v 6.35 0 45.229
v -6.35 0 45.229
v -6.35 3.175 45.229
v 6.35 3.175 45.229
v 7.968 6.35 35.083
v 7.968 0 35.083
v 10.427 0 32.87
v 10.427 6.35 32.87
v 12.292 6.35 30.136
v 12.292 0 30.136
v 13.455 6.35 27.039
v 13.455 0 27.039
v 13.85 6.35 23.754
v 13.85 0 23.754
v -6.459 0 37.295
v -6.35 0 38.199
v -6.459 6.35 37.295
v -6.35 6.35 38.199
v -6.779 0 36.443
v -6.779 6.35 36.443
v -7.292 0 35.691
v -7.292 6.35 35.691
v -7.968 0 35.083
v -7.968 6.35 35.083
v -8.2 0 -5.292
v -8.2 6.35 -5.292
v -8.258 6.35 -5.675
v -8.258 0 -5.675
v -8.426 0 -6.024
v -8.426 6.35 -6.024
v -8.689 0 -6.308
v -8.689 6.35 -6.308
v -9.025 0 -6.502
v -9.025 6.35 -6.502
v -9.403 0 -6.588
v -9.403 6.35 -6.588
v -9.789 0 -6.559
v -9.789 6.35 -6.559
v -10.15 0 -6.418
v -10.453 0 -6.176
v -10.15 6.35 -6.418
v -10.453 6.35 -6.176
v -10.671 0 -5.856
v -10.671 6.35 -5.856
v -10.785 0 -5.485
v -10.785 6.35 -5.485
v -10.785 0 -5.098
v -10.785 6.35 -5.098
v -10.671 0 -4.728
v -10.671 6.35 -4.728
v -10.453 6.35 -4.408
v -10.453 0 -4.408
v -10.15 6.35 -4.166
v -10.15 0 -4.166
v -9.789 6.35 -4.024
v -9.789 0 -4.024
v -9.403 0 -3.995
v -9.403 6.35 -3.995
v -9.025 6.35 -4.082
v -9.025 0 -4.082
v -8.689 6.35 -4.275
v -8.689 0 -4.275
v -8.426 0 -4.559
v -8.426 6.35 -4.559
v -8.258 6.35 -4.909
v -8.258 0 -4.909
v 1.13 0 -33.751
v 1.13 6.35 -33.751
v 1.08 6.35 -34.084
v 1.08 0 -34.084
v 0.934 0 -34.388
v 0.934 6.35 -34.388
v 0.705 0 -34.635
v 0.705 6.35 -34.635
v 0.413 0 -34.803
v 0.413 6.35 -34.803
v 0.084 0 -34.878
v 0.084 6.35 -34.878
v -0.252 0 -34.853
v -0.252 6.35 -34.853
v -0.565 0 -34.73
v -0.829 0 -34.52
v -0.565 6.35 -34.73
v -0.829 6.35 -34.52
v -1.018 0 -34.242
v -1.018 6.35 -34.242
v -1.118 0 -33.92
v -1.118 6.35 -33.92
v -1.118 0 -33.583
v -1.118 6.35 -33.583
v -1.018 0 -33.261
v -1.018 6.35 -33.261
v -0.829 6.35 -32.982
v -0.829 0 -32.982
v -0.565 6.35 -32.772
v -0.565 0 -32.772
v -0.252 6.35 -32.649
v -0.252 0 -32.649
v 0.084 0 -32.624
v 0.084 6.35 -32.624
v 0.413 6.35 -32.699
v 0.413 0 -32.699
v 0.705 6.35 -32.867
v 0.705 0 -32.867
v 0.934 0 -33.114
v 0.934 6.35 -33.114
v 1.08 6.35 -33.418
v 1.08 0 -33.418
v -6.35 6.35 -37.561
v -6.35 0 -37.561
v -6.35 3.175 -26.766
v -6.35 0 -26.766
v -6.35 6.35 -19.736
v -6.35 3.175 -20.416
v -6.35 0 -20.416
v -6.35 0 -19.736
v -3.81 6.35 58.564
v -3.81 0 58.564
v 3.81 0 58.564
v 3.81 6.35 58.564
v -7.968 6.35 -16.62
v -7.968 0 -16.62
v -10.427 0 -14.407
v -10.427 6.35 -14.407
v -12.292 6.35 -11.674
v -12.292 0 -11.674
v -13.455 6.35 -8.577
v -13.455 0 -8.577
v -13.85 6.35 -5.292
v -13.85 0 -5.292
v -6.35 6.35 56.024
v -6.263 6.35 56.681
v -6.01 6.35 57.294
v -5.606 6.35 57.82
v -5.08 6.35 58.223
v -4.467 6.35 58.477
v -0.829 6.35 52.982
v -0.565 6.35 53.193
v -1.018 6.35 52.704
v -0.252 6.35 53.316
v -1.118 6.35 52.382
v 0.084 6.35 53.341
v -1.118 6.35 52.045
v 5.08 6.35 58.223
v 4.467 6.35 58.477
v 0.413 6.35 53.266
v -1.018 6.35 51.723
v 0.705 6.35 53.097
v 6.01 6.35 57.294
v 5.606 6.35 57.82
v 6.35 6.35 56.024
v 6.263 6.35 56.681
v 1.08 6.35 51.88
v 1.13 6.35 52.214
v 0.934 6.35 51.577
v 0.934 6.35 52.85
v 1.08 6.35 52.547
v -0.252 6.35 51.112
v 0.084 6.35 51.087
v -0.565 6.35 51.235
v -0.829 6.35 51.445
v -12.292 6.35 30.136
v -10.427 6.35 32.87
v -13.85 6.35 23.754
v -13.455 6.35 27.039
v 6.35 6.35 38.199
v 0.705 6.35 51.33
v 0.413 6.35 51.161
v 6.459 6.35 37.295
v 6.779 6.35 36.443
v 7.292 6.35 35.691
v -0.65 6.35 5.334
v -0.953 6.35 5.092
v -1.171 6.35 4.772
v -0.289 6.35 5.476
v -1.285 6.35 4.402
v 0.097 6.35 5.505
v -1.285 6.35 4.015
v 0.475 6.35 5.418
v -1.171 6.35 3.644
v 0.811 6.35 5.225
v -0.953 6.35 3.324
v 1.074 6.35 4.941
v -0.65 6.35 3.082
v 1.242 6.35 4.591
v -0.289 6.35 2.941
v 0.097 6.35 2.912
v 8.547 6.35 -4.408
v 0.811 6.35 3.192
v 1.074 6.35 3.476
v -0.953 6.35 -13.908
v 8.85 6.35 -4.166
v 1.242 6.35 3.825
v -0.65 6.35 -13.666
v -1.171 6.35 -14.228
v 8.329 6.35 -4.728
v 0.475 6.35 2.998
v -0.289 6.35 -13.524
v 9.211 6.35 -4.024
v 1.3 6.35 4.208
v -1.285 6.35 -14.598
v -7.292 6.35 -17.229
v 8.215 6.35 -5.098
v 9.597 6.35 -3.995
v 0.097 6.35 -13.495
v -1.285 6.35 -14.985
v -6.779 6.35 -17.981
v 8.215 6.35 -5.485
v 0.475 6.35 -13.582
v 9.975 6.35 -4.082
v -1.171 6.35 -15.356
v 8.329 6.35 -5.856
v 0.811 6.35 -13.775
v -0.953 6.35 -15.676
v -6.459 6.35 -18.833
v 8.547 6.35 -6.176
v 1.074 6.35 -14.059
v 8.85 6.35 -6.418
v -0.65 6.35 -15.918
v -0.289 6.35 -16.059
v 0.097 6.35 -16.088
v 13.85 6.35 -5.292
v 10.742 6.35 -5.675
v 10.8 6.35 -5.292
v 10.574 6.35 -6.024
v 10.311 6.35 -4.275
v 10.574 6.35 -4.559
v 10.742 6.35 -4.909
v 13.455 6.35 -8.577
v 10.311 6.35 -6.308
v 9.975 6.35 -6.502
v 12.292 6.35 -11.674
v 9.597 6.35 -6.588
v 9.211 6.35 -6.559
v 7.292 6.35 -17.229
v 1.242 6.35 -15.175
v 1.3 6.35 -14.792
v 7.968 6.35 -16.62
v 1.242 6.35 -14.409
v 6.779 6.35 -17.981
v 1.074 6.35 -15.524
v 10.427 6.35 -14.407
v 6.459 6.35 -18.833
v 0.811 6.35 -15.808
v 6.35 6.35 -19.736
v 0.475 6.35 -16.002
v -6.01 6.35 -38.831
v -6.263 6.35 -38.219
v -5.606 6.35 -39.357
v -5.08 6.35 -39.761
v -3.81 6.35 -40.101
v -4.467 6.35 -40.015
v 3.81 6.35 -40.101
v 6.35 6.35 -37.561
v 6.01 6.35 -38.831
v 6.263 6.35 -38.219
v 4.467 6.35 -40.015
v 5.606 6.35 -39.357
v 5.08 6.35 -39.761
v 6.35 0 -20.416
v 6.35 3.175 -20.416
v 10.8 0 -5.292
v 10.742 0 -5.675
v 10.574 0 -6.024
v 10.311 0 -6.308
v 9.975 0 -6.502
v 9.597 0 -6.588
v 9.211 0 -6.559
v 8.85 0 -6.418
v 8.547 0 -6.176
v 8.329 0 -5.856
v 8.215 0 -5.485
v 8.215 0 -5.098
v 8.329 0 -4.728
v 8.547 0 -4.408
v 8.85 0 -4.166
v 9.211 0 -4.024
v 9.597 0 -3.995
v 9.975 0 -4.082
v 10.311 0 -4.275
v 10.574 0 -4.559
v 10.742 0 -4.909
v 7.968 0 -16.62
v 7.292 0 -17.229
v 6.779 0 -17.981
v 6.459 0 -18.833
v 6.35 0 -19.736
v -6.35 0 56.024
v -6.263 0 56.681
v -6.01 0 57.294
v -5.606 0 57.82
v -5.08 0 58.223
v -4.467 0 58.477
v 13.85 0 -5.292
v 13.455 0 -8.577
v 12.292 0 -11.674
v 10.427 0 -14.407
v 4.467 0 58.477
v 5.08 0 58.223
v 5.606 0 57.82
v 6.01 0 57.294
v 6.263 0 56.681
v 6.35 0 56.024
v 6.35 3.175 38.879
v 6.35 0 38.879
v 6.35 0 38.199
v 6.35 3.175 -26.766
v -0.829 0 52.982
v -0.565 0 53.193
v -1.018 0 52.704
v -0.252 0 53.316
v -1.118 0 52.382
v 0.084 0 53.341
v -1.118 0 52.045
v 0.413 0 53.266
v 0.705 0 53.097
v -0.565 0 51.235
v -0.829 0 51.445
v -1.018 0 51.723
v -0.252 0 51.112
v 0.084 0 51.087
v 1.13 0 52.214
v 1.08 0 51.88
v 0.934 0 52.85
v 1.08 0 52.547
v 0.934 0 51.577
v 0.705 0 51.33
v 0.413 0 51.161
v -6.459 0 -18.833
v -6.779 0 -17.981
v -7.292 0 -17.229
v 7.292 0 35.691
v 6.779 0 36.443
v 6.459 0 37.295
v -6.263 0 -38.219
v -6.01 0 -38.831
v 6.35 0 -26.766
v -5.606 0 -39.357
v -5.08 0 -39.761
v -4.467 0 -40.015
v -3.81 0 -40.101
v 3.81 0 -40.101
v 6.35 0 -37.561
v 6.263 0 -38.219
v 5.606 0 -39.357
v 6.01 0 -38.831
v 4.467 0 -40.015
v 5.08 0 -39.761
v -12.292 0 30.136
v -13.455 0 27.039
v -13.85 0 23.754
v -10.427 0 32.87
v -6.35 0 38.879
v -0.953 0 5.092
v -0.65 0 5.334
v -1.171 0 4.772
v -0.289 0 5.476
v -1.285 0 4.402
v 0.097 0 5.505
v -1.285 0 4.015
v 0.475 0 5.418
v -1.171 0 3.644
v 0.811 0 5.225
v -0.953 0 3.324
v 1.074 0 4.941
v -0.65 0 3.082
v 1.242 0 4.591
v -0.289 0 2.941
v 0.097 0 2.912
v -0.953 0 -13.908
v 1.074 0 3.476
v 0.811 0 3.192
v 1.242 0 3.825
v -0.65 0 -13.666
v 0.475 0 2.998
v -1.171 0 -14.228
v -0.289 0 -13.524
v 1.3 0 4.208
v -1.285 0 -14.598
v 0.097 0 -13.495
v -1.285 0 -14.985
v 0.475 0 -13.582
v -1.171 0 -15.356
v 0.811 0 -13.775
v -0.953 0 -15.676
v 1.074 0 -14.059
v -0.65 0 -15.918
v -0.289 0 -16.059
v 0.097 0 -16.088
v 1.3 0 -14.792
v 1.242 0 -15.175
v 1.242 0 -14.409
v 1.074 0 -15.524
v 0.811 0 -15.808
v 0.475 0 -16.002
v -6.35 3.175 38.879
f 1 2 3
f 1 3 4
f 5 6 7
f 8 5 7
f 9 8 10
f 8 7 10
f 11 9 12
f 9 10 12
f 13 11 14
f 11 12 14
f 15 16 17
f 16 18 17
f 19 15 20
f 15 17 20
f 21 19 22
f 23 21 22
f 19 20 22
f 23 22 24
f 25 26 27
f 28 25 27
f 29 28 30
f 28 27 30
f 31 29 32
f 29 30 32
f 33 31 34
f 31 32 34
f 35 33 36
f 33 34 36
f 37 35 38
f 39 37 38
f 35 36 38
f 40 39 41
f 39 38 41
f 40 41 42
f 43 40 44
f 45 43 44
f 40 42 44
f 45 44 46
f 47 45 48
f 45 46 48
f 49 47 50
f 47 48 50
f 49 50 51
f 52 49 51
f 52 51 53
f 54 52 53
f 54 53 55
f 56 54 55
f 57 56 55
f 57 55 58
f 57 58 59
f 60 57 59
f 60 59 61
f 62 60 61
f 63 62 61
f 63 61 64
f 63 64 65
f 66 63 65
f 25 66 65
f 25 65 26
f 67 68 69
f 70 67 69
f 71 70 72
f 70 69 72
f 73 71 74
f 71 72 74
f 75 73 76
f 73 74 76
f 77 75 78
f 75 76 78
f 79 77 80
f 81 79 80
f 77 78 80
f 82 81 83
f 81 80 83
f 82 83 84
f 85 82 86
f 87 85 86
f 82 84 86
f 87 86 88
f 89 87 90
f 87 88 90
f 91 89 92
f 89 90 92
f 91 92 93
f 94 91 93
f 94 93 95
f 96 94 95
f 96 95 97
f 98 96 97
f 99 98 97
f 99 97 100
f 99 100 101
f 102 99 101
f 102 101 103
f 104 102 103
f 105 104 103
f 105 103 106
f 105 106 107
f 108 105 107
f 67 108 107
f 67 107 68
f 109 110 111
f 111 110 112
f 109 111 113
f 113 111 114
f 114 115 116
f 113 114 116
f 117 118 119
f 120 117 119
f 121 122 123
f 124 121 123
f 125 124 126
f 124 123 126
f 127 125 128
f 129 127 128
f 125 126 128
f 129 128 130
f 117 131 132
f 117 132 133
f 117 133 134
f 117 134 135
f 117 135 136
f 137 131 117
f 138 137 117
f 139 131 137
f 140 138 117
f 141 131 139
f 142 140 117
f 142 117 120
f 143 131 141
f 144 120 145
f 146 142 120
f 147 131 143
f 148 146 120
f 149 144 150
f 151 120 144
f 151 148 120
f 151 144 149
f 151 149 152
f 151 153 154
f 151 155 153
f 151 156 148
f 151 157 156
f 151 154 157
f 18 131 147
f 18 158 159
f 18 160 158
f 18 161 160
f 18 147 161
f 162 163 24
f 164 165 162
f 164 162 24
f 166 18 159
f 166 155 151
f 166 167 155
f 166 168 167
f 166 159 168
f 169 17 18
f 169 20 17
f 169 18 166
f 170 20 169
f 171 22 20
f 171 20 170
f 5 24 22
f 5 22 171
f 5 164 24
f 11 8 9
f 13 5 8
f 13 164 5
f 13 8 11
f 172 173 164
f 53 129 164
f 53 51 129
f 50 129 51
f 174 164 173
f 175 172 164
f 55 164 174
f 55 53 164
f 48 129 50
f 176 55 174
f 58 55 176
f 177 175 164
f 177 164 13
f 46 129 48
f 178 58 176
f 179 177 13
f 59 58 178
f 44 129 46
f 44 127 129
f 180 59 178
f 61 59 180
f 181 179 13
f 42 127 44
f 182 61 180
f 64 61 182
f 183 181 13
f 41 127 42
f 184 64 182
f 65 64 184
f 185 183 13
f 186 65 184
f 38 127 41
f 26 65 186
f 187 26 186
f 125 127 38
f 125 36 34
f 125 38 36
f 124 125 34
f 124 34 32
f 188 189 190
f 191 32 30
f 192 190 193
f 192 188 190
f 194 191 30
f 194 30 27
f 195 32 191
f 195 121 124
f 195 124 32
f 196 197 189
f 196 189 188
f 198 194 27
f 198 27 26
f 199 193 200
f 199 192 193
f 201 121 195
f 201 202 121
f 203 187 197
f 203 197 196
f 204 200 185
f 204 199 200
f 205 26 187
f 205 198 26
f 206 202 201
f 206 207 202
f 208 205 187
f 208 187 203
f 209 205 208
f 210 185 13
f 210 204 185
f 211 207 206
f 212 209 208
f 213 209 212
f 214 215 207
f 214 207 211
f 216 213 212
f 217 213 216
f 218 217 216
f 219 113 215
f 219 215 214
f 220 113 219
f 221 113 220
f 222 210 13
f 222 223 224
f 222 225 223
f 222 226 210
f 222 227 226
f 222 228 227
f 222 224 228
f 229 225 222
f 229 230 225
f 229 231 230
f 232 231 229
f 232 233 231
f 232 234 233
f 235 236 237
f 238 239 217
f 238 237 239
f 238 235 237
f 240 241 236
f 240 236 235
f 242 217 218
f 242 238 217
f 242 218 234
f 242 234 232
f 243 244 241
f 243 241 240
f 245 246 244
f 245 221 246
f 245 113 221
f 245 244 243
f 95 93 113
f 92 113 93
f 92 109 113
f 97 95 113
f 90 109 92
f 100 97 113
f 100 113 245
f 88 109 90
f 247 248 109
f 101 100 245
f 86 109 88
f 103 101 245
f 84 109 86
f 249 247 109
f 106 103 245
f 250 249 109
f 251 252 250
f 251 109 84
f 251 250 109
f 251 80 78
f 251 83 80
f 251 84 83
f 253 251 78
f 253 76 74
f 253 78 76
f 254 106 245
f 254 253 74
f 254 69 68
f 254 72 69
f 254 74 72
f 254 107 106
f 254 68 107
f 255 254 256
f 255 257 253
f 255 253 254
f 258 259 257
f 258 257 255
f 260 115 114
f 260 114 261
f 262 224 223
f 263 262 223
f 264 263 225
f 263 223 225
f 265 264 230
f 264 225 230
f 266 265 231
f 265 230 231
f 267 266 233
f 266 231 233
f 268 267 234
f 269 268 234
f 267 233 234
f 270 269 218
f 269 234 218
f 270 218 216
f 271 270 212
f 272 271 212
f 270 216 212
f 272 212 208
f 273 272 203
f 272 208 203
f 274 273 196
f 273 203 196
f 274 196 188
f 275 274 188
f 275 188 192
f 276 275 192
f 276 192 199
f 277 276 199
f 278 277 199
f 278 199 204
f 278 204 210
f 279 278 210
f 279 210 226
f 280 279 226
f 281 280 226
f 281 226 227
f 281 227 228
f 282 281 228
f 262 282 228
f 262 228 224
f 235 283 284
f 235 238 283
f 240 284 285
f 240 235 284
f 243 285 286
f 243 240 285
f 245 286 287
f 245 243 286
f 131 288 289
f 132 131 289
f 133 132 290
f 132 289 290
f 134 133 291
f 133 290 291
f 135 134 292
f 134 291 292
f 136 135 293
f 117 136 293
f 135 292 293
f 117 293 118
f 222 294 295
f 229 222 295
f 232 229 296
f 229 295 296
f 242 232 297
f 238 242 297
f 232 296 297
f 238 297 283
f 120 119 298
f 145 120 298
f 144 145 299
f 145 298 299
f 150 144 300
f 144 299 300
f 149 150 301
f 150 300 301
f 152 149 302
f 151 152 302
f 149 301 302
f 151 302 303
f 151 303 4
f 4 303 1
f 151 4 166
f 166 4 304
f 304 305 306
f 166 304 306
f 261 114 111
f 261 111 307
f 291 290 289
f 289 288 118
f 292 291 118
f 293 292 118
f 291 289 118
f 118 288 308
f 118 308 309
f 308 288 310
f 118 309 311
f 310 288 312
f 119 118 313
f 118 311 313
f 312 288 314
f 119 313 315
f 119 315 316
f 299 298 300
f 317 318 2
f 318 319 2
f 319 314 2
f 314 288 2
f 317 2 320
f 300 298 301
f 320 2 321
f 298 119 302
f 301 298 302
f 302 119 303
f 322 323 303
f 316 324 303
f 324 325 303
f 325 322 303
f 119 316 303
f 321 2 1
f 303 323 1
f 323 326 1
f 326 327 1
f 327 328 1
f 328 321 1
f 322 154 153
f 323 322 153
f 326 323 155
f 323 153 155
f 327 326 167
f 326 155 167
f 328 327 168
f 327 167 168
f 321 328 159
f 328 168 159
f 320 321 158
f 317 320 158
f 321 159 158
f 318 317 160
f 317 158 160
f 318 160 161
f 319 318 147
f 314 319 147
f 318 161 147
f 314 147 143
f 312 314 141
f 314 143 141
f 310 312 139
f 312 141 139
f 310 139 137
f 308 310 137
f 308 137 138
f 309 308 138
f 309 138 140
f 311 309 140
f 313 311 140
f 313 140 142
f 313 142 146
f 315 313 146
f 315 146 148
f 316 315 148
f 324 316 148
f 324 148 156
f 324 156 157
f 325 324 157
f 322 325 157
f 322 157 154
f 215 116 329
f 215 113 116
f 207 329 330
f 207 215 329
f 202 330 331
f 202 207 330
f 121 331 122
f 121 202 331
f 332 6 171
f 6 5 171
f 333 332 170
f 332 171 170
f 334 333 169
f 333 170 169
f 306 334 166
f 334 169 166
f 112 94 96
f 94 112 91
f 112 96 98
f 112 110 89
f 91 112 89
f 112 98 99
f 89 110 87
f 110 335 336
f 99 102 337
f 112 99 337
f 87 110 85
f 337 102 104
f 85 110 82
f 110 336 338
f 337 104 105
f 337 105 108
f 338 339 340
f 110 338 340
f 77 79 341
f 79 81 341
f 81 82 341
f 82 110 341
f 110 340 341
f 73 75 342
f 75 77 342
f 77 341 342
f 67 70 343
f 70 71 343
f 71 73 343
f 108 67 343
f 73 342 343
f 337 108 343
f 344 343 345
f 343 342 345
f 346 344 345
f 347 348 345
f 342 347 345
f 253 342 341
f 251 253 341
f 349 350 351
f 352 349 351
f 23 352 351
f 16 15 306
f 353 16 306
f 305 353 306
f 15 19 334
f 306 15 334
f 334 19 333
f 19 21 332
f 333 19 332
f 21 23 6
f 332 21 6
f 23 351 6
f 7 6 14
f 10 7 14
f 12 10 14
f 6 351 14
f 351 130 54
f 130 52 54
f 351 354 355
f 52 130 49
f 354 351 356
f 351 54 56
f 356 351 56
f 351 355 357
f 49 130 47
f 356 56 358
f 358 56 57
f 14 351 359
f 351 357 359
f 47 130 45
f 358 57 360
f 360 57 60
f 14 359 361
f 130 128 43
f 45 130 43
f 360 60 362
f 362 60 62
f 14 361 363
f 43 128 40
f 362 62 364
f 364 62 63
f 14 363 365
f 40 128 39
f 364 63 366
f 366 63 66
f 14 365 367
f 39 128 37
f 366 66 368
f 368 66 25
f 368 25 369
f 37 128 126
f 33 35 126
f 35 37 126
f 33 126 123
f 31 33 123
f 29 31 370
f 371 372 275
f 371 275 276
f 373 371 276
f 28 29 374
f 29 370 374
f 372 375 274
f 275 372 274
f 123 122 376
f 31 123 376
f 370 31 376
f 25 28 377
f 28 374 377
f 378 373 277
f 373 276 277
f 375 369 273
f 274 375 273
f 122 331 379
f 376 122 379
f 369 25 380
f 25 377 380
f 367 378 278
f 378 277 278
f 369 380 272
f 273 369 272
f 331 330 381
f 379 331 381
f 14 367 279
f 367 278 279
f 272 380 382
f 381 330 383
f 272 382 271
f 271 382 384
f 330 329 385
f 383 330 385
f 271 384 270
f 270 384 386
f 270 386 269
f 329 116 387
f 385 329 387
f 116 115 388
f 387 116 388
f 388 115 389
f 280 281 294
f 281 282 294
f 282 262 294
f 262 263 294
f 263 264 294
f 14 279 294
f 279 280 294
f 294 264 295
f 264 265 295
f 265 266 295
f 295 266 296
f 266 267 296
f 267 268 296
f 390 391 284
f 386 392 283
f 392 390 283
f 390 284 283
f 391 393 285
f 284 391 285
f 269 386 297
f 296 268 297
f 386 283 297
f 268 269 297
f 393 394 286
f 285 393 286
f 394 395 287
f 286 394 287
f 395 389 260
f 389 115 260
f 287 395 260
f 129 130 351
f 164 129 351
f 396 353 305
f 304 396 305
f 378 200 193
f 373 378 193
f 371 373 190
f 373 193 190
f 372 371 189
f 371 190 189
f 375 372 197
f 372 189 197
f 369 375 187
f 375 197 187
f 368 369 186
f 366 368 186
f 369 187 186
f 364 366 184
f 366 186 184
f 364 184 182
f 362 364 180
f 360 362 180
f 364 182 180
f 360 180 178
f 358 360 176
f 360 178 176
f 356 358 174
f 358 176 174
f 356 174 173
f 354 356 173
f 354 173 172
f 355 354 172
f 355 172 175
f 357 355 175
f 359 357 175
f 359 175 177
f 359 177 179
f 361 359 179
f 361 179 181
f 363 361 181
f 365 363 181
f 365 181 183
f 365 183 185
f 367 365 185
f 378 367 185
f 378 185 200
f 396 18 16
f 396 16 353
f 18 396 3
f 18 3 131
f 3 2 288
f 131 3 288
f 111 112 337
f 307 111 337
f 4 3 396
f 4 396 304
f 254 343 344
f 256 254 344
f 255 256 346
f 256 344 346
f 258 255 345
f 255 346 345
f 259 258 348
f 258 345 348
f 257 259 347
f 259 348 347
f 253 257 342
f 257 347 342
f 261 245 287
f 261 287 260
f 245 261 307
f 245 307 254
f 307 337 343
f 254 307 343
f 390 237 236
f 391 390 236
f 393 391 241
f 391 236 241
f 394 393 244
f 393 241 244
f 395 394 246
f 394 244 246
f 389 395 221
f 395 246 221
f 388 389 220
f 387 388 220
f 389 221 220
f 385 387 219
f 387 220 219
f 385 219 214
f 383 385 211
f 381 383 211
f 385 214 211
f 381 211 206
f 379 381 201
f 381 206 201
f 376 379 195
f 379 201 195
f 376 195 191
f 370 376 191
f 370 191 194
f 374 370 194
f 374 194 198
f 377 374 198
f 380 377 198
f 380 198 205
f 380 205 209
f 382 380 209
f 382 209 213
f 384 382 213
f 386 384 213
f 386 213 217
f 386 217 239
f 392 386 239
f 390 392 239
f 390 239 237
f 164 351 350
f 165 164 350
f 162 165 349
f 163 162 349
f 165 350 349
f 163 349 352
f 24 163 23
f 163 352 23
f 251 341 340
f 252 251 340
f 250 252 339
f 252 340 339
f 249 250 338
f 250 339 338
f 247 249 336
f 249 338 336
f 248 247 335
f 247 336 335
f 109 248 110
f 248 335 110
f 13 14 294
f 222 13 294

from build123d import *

# Parameters (mm, degrees)
BOSS_EXTRUDE1_DEPTH   = 6.35
SKETCH3_W             = 12.7
SKETCH3_H             = 6.35
SKETCH3_R             = 1.651
CUT_EXTRUDE2_DEPTH    = 3.175
F_4_40_TAPPED_HOLE1_D = 2.2606
M2_CLEARANCE_HOLE1_D  = 2.6
FILLET1_R             = 3.81


with BuildPart() as part:
    # Sketch1 → Boss-Extrude1 (new body)
    with BuildSketch(Plane(origin=(0, 0, 0), x_dir=(1, 0, 0), z_dir=(0, 1, 0))):
        with BuildLine():
            Line((13.850000078, -23.754236173), (13.850000078, 5.291734921))
            ThreePointArc((13.850000078, 5.291734921), (11.827298987, 12.498502631), (6.35, 17.600268634))
            Line((6.35, 17.600268634), (6.35, 37.56114916))
            ThreePointArc((6.35, 37.56114916), (5.606051224, 39.357200384), (3.81, 40.10114916))
            Line((3.81, 40.10114916), (-3.81, 40.10114916))
            ThreePointArc((-3.81, 40.10114916), (-5.606051224, 39.357200384), (-6.35, 37.56114916))
            Line((-6.35, 37.56114916), (-6.35, 17.600268634))
            ThreePointArc((-6.35, 17.600268634), (-11.827298987, 12.498502631), (-13.850000078, 5.291734921))
            Line((-13.850000078, 5.291734921), (-13.850000078, -23.754236173))
            ThreePointArc((-13.850000078, -23.754236173), (-11.827298987, -30.961003884), (-6.35, -36.062769886))
            Line((-6.35, -36.062769886), (-6.35, -56.023651732))
            ThreePointArc((-6.35, -56.023651732), (-5.606051224, -57.819702956), (-3.81, -58.563651732))
            Line((-3.81, -58.563651732), (3.81, -58.563651732))
            ThreePointArc((3.81, -58.563651732), (5.606051224, -57.819702956), (6.35, -56.023651732))
            Line((6.35, -56.023651732), (6.35, -36.062769886))
            ThreePointArc((6.35, -36.062769886), (11.827298987, -30.961003884), (13.850000078, -23.754236173))
        make_face()
    extrude(amount=BOSS_EXTRUDE1_DEPTH)

    # Sketch3 → Cut-Extrude2 (cut)
    with BuildSketch(Plane.XZ):
        with Locations((0, -23.59114916)):
            Rectangle(SKETCH3_W, SKETCH3_H)
        with Locations((0, -23.59114916)):
            Circle(SKETCH3_R, mode=Mode.SUBTRACT)
        with Locations((0, -23.59114916)):
            Circle(SKETCH3_R)
        with Locations((0, 42.053651732)):
            Rectangle(SKETCH3_W, SKETCH3_H)
        with Locations((0, 42.053651732)):
            Circle(SKETCH3_R, mode=Mode.SUBTRACT)
        with Locations((0, 42.053651732)):
            Circle(SKETCH3_R)
    extrude(amount=-CUT_EXTRUDE2_DEPTH, mode=Mode.SUBTRACT)

    # #4-40 Tapped Hole1 (through all)
    with Locations(Plane(origin=(0, 0, 0), x_dir=(-1, 0, 0), z_dir=(0, -1, 0))):
        with Locations((0, -52.213651732), (0, 33.75114916)):
            Hole(F_4_40_TAPPED_HOLE1_D / 2)

    # M2 Clearance Hole1 (through all)
    with Locations(Plane(origin=(0, 0, 0), x_dir=(-1, 0, 0), z_dir=(0, -1, 0))):
        with Locations((9.50000005, 5.291734921), (0, 14.791734971), (-9.50000005, 5.291734921), (0, -4.208265129)):
            Hole(M2_CLEARANCE_HOLE1_D / 2)

    # Fillet1
    fillet1_edges = [part.edges().sort_by_distance(p)[0] for p in [
        (-6.35, 3.175, 36.062769886),
        (-6.35, 3.175, -17.600268634),
        (6.35, 3.175, -17.600268634),
        (6.35, 3.175, 36.062769886),
    ]]
    fillet(fillet1_edges, radius=FILLET1_R)


solid = part.part
